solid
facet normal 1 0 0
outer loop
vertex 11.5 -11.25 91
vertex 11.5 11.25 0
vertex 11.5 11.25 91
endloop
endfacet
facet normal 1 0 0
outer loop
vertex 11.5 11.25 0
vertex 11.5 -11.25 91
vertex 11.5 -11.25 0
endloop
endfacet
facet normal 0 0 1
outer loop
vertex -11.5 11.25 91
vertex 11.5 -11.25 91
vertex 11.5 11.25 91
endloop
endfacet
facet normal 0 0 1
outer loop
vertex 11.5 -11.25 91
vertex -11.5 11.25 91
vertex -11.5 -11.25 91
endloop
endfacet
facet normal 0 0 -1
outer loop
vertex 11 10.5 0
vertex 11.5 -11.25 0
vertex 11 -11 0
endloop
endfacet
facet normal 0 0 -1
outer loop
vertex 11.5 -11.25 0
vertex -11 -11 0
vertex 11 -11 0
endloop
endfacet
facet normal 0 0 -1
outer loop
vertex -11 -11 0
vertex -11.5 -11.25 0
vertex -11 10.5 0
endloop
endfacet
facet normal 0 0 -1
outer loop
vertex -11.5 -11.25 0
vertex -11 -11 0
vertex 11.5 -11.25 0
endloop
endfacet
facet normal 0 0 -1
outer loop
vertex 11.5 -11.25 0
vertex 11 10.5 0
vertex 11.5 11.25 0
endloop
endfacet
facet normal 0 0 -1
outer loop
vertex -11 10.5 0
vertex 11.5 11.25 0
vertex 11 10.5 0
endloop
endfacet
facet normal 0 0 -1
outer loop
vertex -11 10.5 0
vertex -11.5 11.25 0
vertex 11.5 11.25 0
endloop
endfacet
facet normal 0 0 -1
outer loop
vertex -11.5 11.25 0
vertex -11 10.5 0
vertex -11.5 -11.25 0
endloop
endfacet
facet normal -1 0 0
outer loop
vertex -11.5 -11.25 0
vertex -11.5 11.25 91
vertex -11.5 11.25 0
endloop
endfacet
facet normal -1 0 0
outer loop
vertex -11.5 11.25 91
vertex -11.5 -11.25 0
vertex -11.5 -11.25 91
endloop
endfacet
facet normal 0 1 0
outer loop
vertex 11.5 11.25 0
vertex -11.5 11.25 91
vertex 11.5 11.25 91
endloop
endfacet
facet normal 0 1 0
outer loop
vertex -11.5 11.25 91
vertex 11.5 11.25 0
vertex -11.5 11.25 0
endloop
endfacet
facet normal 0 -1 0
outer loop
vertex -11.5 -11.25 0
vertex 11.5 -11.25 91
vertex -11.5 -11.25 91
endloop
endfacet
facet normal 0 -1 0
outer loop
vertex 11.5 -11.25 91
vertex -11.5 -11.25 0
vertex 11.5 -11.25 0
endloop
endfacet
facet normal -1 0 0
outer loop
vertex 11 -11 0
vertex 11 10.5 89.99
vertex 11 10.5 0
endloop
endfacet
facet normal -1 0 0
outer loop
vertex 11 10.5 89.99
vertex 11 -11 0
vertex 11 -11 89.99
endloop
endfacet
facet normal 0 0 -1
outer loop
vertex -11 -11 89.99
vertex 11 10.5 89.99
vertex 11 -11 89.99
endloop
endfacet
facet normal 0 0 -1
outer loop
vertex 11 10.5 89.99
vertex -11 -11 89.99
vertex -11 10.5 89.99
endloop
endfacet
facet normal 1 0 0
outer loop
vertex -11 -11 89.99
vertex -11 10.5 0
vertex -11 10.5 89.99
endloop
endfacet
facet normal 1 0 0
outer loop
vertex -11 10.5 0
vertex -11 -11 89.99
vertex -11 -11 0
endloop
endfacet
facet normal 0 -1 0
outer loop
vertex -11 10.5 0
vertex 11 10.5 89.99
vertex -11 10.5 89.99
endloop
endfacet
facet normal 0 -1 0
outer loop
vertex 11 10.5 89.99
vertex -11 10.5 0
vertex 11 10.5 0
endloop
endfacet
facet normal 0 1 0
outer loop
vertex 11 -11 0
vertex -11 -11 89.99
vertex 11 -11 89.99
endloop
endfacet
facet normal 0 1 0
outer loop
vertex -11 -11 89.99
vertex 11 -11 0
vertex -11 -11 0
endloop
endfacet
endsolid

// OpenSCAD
// file: config.scad
// Render options
$fn = 500;
nothing = 0.01;

// Monitor parameters
monitor_width = 0;
monitor_height = 0;
monitor_thickness = 0;
monitor_socket_widthx = 22;
monitor_socket_widthy = 21.5;
monitor_socket_height = 90;
monitor_socket_thickness = 1;

// Metal support
angle_lengthx = 120;
angle_lengthy = 120;
angle_width = 20;
angle_thickness = 5;

// Foot parameters
foot_bottom_height = 4;

// Spacer
spacer_width = monitor_socket_widthx - 0.5;
spacer_height = angle_lengthy;
spacer_thickness = monitor_socket_widthy - 2*angle_thickness - 2*0.5;

// More foot parameters
foot_anglecap_thickness = 4;
foot_anglecap_width = angle_width + 2*foot_anglecap_thickness;
foot_anglecap_height = angle_thickness + foot_anglecap_thickness;
foot_anglecap_length = spacer_thickness/2 + angle_lengthx + foot_anglecap_thickness;
foot_bottom_width = 80;
foot_bottom_length = foot_anglecap_thickness + angle_lengthx + spacer_thickness/2;

// Where to insert the angle into the foot
insertion_hole_width = angle_width + 0.5;
insertion_hole_length = angle_thickness + spacer_thickness/2 + 0.5;
pocket_width = angle_width + 0.5;
pocket_height = angle_thickness + 0.5;
pocket_length = foot_bottom_length - foot_anglecap_thickness + 0.5;
// main file
include <config.scad>;

module monitor_socket() {
    color([1, 1, 1, 0.6]) {
        difference() {
            // Block incl. walls
            wx_outer = monitor_socket_widthx + monitor_socket_thickness;
            wy_outer = monitor_socket_widthy + monitor_socket_thickness;
            translate([
                -wx_outer/2,
                -wy_outer/2,
                0
                ])
            cube([
                wx_outer,
                wy_outer,
                monitor_socket_height + monitor_socket_thickness
                ]);

            // Hole
            translate([
                -monitor_socket_widthx/2,
                -monitor_socket_widthx/2,
                -nothing
                ])
            cube([
                monitor_socket_widthx,
                monitor_socket_widthy,
                monitor_socket_height,
                ]);
        }
    }
}

monitor_socket();
